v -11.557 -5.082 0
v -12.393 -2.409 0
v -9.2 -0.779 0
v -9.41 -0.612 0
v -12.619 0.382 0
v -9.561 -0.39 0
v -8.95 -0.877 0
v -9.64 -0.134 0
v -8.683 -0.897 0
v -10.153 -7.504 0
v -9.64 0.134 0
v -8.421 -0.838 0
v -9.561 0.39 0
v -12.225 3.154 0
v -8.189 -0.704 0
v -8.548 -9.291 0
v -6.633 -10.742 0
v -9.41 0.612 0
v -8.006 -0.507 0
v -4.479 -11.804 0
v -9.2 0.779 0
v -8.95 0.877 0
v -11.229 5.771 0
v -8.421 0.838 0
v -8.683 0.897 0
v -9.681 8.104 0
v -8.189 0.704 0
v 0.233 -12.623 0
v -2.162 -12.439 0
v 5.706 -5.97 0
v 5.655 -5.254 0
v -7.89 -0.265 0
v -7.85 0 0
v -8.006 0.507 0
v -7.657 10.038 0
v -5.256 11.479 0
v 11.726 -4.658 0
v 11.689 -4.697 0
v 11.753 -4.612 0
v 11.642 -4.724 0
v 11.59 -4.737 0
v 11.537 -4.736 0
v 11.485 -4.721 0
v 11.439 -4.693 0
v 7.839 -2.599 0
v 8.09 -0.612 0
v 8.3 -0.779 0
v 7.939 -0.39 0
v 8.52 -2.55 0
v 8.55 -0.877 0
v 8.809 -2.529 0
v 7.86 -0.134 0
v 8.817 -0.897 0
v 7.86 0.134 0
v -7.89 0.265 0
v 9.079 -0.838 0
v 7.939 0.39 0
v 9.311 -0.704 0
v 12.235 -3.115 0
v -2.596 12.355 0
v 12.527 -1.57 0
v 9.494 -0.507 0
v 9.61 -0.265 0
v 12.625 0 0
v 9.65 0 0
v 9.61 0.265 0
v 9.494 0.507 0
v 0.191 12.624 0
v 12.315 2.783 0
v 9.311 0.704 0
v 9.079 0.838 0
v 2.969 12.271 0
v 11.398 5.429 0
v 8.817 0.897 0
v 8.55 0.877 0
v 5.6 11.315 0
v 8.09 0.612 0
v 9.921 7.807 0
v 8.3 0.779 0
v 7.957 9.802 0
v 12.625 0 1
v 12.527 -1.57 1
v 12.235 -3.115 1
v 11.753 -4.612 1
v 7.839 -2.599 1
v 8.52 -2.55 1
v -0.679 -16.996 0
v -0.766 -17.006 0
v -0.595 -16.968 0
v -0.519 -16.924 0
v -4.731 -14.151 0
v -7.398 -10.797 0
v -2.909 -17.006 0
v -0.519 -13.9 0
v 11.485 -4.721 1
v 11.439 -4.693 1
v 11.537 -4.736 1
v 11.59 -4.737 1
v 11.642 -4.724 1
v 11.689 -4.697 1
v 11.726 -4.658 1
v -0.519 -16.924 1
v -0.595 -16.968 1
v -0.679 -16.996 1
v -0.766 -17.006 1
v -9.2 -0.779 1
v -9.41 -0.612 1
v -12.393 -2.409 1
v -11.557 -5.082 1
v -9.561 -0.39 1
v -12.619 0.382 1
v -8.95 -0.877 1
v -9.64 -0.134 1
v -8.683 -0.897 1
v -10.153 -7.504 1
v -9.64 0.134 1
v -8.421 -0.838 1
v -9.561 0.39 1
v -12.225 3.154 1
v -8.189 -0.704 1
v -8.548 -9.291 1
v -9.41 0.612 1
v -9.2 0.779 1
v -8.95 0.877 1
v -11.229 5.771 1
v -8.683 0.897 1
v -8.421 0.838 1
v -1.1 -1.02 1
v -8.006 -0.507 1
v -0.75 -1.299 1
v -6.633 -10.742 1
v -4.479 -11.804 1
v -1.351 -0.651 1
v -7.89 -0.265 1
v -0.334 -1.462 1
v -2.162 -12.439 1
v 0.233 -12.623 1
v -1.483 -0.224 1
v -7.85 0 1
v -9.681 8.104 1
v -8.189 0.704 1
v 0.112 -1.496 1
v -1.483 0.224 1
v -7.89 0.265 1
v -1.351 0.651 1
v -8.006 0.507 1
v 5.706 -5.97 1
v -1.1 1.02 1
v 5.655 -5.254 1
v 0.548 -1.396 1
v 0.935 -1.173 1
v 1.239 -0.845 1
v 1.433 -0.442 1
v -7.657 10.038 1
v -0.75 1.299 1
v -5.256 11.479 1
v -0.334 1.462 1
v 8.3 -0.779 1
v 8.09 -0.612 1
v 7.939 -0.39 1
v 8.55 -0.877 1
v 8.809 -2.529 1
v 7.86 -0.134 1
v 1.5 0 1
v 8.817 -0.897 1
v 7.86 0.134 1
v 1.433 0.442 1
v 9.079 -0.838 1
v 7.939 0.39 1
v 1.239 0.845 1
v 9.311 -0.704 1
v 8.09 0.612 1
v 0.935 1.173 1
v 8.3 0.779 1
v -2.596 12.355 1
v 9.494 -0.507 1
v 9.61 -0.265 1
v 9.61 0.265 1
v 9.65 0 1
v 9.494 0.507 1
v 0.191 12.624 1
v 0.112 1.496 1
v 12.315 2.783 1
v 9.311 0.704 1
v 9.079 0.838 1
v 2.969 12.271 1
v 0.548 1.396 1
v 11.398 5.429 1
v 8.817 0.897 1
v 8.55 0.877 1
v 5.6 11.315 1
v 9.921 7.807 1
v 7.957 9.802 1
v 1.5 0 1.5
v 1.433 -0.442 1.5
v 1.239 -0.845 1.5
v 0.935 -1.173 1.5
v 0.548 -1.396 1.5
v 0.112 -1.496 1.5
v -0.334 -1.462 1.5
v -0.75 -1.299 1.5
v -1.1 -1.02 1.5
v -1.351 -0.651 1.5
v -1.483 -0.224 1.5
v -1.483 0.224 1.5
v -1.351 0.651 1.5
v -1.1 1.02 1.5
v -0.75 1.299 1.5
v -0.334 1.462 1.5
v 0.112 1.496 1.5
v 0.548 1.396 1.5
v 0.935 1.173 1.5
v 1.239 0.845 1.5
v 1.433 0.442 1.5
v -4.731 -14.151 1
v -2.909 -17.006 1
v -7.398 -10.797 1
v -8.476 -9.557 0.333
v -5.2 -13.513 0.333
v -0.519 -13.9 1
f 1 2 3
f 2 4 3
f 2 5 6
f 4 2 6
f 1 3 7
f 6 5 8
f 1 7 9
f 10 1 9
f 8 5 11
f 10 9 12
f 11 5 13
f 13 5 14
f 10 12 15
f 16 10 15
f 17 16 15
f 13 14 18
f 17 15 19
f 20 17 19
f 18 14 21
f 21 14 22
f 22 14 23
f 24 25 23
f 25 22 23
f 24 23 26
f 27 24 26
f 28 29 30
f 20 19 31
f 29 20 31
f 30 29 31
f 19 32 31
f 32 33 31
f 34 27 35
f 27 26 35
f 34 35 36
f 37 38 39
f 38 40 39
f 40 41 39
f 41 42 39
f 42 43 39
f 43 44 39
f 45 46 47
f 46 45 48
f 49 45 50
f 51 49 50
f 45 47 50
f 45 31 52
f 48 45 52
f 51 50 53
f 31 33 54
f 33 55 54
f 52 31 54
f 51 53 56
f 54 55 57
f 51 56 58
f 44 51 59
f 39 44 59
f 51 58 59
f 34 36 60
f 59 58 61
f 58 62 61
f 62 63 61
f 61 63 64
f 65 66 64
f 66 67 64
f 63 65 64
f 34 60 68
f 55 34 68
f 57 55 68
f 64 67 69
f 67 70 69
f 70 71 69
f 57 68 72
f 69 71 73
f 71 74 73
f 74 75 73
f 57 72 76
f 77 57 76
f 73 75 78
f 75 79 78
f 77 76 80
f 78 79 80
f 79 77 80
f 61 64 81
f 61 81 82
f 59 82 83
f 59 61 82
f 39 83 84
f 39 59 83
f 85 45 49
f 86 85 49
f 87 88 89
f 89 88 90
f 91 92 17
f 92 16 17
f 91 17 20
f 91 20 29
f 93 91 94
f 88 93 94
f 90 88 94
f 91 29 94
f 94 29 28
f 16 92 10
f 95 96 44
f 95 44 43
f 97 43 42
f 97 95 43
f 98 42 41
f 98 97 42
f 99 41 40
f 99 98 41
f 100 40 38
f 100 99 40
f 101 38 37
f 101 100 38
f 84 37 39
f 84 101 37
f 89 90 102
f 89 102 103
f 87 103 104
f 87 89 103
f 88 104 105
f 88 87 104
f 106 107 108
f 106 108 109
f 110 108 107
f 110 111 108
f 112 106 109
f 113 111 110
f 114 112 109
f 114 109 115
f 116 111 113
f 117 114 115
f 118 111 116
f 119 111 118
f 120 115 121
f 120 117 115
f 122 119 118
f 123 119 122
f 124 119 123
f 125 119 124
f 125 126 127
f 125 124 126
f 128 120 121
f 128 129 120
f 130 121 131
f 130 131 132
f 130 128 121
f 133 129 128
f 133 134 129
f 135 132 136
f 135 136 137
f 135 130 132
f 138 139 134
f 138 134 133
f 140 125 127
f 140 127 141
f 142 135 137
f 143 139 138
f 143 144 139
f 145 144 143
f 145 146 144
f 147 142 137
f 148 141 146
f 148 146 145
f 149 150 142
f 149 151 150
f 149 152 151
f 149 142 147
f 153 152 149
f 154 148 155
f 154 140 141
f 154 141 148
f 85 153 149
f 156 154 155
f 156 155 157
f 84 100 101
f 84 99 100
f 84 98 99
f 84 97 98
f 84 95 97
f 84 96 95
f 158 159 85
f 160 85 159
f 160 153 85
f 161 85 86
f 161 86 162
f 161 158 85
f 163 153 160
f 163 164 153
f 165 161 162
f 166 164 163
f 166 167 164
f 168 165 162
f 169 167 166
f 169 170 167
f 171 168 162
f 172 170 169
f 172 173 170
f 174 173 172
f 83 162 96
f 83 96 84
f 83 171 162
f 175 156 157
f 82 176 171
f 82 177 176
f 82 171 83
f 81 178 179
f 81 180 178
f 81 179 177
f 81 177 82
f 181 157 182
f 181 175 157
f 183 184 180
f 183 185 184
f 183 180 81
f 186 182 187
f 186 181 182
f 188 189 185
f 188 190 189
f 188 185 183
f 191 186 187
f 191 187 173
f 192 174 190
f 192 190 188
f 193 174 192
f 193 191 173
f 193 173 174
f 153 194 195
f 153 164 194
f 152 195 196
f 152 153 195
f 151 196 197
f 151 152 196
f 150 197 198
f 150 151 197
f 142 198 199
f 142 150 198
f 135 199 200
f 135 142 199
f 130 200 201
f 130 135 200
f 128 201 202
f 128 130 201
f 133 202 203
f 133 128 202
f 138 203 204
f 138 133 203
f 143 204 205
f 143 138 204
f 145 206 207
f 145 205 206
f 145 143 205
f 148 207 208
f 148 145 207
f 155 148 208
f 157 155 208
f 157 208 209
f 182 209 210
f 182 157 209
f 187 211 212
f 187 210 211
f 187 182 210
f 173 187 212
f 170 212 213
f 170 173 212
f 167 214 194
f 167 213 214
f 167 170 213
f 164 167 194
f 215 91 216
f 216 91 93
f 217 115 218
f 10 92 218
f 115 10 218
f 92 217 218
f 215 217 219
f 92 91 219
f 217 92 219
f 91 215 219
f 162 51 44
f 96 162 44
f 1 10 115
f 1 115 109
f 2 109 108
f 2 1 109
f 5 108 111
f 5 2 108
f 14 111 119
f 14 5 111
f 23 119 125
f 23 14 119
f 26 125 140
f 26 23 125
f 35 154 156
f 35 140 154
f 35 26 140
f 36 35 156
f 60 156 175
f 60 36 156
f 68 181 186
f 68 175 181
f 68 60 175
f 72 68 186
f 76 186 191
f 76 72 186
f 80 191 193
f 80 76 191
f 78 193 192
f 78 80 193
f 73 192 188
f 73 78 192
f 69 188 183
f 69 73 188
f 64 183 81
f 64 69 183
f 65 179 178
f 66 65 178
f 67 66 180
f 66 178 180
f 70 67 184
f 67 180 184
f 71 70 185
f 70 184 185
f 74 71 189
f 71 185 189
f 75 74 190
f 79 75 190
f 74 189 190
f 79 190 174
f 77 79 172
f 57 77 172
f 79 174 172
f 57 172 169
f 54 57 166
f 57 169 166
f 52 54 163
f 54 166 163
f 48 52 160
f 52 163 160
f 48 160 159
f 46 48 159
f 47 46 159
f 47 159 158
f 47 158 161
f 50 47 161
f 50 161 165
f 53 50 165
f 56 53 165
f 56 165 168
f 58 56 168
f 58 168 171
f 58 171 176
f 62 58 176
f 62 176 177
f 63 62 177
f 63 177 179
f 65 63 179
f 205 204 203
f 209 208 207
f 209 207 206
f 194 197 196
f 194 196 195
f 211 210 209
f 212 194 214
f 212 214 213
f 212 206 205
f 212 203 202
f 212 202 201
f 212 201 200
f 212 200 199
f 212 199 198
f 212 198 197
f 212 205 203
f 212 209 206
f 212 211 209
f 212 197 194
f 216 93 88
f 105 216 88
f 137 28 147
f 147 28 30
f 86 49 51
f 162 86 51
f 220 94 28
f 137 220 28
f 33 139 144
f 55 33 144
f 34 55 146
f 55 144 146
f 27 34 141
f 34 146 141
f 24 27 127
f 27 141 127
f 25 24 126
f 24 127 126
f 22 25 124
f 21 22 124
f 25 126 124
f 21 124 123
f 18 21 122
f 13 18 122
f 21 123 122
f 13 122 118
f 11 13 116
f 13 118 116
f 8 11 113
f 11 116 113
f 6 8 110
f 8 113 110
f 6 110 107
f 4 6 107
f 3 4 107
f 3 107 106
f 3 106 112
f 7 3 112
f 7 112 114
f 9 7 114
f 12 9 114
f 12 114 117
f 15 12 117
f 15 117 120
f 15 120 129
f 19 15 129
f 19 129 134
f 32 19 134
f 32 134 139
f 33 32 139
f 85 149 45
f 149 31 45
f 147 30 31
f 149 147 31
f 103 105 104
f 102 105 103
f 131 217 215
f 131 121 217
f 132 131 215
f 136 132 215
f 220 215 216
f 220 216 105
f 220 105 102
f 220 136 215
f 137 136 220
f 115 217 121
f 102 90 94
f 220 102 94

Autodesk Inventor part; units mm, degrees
ref_plane "YZ Plane" through (0, 0, 0) normal (1, 0, 0) x (0, 1, 0)
ref_plane "XZ Plane" through (0, 0, 0) normal (0, 1, 0) x (-1, 0, 0)
ref_plane "XY Plane" through (0, 0, 0) normal (0, 0, 1) x (1, 0, 0)
sketch "Skizze1" plane through (0, 0, 0) normal (0, 0, 1) x (1, 0, 0)
  circle A0 centre (0, 0) radius 12.625
  line L0 (31.2972, 39.0088) -> (31.2972, -40.1485) construction
  line L1 (31.2972, -40.1485) -> (-28.0708, -40.1485) construction
  line L2 (-28.0708, -40.1485) -> (-28.0708, 39.0088) construction
  line L3 (-28.0708, 39.0088) -> (31.2972, 39.0088) construction
  line L4 (-10.1529, -7.5039) -> (-9.5297, -8.4617) construction
  line L5 (-9.5297, -8.4617) -> (-6.7964, -11.288) construction
  line L6 (-6.7964, -11.288) -> (-4.1897, -14.7808) construction
  line L7 (-4.1897, -14.7808) -> (-3.5273, -15.9852) construction
  line L8 (-3.5273, -15.9852) -> (-2.9089, -17.0055) construction
  spline S0 degree 4 poles (-10.1529, -7.5039) (-10.1523, -7.5049) (-9.5297, -8.4617) (-6.7964, -11.288) (-4.1897, -14.7808) (-3.5273, -15.9852) (-2.9089, -17.0055) knots 1 1 1 1 1 2 3 4 4 4 4 4
  line L9 (-2.9089, -17.0055) -> (-0.7662, -17.0055)
  arc A1 (-0.7662, -17.0055) -> (-0.5189, -16.9237) centre (-0.7662, -16.5904) ccw
  line L10 (-0.5189, -16.9237) -> (-0.5189, -13.9001)
  line L11 (-0.5189, -13.9001) -> (0.2333, -12.6228)
  line L12 (0.2333, -12.6228) -> (8.5203, -2.5497)
  line L13 (8.809, -2.5289) -> (11.6496, -4.8659)
  line L14 (5.7065, -5.97) -> (5.6548, -5.2536)
  line L15 (5.6548, -5.2536) -> (7.8388, -2.5989)
  line L16 (7.8388, -2.5989) -> (8.809, -2.5289)
  dimension "d0" = 25.25
extrude "Extrusion1" add sketch "Skizze1" along normal blind 1 contours A0 L13 L16 L15 L14 L12 | A0 L11 L10 A1 L9 S0
fillet "Rundung1" radius 0.2 2 edges at (11.6496, -4.8659, 0.5) (8.5203, -2.5497, 0.5)
sketch "Skizze2" plane through (0, 0, 1) normal (0, 0, 1) x (1, 0, 0)
  circle A0 centre (0, 0) radius 1.5
  dimension "d46" = 3
extrude "Extrusion2" add sketch "Skizze2" along normal blind 0.5
sketch "Skizze3" plane through (0, 0, 1) normal (0, 0, 1) x (1, 0, 0)
  line L0 (-8.75, 0) -> (8.75, 0) construction
  circle A0 centre (-8.75, 0) radius 0.9
  circle A1 centre (8.75, 0) radius 0.9
  point P0 (0, 0)
  dimension "d49" = 17.5
  dimension "d50" = 8.75
  dimension "d51" = 1.8
  dimension "d52" = 1.8
extrude "Extrusion3" cut sketch "Skizze3" against normal through all
equation "\"d50\" = 0.5 * d49"
equation "\"d52\" = d51"
properties part number "pcb"
